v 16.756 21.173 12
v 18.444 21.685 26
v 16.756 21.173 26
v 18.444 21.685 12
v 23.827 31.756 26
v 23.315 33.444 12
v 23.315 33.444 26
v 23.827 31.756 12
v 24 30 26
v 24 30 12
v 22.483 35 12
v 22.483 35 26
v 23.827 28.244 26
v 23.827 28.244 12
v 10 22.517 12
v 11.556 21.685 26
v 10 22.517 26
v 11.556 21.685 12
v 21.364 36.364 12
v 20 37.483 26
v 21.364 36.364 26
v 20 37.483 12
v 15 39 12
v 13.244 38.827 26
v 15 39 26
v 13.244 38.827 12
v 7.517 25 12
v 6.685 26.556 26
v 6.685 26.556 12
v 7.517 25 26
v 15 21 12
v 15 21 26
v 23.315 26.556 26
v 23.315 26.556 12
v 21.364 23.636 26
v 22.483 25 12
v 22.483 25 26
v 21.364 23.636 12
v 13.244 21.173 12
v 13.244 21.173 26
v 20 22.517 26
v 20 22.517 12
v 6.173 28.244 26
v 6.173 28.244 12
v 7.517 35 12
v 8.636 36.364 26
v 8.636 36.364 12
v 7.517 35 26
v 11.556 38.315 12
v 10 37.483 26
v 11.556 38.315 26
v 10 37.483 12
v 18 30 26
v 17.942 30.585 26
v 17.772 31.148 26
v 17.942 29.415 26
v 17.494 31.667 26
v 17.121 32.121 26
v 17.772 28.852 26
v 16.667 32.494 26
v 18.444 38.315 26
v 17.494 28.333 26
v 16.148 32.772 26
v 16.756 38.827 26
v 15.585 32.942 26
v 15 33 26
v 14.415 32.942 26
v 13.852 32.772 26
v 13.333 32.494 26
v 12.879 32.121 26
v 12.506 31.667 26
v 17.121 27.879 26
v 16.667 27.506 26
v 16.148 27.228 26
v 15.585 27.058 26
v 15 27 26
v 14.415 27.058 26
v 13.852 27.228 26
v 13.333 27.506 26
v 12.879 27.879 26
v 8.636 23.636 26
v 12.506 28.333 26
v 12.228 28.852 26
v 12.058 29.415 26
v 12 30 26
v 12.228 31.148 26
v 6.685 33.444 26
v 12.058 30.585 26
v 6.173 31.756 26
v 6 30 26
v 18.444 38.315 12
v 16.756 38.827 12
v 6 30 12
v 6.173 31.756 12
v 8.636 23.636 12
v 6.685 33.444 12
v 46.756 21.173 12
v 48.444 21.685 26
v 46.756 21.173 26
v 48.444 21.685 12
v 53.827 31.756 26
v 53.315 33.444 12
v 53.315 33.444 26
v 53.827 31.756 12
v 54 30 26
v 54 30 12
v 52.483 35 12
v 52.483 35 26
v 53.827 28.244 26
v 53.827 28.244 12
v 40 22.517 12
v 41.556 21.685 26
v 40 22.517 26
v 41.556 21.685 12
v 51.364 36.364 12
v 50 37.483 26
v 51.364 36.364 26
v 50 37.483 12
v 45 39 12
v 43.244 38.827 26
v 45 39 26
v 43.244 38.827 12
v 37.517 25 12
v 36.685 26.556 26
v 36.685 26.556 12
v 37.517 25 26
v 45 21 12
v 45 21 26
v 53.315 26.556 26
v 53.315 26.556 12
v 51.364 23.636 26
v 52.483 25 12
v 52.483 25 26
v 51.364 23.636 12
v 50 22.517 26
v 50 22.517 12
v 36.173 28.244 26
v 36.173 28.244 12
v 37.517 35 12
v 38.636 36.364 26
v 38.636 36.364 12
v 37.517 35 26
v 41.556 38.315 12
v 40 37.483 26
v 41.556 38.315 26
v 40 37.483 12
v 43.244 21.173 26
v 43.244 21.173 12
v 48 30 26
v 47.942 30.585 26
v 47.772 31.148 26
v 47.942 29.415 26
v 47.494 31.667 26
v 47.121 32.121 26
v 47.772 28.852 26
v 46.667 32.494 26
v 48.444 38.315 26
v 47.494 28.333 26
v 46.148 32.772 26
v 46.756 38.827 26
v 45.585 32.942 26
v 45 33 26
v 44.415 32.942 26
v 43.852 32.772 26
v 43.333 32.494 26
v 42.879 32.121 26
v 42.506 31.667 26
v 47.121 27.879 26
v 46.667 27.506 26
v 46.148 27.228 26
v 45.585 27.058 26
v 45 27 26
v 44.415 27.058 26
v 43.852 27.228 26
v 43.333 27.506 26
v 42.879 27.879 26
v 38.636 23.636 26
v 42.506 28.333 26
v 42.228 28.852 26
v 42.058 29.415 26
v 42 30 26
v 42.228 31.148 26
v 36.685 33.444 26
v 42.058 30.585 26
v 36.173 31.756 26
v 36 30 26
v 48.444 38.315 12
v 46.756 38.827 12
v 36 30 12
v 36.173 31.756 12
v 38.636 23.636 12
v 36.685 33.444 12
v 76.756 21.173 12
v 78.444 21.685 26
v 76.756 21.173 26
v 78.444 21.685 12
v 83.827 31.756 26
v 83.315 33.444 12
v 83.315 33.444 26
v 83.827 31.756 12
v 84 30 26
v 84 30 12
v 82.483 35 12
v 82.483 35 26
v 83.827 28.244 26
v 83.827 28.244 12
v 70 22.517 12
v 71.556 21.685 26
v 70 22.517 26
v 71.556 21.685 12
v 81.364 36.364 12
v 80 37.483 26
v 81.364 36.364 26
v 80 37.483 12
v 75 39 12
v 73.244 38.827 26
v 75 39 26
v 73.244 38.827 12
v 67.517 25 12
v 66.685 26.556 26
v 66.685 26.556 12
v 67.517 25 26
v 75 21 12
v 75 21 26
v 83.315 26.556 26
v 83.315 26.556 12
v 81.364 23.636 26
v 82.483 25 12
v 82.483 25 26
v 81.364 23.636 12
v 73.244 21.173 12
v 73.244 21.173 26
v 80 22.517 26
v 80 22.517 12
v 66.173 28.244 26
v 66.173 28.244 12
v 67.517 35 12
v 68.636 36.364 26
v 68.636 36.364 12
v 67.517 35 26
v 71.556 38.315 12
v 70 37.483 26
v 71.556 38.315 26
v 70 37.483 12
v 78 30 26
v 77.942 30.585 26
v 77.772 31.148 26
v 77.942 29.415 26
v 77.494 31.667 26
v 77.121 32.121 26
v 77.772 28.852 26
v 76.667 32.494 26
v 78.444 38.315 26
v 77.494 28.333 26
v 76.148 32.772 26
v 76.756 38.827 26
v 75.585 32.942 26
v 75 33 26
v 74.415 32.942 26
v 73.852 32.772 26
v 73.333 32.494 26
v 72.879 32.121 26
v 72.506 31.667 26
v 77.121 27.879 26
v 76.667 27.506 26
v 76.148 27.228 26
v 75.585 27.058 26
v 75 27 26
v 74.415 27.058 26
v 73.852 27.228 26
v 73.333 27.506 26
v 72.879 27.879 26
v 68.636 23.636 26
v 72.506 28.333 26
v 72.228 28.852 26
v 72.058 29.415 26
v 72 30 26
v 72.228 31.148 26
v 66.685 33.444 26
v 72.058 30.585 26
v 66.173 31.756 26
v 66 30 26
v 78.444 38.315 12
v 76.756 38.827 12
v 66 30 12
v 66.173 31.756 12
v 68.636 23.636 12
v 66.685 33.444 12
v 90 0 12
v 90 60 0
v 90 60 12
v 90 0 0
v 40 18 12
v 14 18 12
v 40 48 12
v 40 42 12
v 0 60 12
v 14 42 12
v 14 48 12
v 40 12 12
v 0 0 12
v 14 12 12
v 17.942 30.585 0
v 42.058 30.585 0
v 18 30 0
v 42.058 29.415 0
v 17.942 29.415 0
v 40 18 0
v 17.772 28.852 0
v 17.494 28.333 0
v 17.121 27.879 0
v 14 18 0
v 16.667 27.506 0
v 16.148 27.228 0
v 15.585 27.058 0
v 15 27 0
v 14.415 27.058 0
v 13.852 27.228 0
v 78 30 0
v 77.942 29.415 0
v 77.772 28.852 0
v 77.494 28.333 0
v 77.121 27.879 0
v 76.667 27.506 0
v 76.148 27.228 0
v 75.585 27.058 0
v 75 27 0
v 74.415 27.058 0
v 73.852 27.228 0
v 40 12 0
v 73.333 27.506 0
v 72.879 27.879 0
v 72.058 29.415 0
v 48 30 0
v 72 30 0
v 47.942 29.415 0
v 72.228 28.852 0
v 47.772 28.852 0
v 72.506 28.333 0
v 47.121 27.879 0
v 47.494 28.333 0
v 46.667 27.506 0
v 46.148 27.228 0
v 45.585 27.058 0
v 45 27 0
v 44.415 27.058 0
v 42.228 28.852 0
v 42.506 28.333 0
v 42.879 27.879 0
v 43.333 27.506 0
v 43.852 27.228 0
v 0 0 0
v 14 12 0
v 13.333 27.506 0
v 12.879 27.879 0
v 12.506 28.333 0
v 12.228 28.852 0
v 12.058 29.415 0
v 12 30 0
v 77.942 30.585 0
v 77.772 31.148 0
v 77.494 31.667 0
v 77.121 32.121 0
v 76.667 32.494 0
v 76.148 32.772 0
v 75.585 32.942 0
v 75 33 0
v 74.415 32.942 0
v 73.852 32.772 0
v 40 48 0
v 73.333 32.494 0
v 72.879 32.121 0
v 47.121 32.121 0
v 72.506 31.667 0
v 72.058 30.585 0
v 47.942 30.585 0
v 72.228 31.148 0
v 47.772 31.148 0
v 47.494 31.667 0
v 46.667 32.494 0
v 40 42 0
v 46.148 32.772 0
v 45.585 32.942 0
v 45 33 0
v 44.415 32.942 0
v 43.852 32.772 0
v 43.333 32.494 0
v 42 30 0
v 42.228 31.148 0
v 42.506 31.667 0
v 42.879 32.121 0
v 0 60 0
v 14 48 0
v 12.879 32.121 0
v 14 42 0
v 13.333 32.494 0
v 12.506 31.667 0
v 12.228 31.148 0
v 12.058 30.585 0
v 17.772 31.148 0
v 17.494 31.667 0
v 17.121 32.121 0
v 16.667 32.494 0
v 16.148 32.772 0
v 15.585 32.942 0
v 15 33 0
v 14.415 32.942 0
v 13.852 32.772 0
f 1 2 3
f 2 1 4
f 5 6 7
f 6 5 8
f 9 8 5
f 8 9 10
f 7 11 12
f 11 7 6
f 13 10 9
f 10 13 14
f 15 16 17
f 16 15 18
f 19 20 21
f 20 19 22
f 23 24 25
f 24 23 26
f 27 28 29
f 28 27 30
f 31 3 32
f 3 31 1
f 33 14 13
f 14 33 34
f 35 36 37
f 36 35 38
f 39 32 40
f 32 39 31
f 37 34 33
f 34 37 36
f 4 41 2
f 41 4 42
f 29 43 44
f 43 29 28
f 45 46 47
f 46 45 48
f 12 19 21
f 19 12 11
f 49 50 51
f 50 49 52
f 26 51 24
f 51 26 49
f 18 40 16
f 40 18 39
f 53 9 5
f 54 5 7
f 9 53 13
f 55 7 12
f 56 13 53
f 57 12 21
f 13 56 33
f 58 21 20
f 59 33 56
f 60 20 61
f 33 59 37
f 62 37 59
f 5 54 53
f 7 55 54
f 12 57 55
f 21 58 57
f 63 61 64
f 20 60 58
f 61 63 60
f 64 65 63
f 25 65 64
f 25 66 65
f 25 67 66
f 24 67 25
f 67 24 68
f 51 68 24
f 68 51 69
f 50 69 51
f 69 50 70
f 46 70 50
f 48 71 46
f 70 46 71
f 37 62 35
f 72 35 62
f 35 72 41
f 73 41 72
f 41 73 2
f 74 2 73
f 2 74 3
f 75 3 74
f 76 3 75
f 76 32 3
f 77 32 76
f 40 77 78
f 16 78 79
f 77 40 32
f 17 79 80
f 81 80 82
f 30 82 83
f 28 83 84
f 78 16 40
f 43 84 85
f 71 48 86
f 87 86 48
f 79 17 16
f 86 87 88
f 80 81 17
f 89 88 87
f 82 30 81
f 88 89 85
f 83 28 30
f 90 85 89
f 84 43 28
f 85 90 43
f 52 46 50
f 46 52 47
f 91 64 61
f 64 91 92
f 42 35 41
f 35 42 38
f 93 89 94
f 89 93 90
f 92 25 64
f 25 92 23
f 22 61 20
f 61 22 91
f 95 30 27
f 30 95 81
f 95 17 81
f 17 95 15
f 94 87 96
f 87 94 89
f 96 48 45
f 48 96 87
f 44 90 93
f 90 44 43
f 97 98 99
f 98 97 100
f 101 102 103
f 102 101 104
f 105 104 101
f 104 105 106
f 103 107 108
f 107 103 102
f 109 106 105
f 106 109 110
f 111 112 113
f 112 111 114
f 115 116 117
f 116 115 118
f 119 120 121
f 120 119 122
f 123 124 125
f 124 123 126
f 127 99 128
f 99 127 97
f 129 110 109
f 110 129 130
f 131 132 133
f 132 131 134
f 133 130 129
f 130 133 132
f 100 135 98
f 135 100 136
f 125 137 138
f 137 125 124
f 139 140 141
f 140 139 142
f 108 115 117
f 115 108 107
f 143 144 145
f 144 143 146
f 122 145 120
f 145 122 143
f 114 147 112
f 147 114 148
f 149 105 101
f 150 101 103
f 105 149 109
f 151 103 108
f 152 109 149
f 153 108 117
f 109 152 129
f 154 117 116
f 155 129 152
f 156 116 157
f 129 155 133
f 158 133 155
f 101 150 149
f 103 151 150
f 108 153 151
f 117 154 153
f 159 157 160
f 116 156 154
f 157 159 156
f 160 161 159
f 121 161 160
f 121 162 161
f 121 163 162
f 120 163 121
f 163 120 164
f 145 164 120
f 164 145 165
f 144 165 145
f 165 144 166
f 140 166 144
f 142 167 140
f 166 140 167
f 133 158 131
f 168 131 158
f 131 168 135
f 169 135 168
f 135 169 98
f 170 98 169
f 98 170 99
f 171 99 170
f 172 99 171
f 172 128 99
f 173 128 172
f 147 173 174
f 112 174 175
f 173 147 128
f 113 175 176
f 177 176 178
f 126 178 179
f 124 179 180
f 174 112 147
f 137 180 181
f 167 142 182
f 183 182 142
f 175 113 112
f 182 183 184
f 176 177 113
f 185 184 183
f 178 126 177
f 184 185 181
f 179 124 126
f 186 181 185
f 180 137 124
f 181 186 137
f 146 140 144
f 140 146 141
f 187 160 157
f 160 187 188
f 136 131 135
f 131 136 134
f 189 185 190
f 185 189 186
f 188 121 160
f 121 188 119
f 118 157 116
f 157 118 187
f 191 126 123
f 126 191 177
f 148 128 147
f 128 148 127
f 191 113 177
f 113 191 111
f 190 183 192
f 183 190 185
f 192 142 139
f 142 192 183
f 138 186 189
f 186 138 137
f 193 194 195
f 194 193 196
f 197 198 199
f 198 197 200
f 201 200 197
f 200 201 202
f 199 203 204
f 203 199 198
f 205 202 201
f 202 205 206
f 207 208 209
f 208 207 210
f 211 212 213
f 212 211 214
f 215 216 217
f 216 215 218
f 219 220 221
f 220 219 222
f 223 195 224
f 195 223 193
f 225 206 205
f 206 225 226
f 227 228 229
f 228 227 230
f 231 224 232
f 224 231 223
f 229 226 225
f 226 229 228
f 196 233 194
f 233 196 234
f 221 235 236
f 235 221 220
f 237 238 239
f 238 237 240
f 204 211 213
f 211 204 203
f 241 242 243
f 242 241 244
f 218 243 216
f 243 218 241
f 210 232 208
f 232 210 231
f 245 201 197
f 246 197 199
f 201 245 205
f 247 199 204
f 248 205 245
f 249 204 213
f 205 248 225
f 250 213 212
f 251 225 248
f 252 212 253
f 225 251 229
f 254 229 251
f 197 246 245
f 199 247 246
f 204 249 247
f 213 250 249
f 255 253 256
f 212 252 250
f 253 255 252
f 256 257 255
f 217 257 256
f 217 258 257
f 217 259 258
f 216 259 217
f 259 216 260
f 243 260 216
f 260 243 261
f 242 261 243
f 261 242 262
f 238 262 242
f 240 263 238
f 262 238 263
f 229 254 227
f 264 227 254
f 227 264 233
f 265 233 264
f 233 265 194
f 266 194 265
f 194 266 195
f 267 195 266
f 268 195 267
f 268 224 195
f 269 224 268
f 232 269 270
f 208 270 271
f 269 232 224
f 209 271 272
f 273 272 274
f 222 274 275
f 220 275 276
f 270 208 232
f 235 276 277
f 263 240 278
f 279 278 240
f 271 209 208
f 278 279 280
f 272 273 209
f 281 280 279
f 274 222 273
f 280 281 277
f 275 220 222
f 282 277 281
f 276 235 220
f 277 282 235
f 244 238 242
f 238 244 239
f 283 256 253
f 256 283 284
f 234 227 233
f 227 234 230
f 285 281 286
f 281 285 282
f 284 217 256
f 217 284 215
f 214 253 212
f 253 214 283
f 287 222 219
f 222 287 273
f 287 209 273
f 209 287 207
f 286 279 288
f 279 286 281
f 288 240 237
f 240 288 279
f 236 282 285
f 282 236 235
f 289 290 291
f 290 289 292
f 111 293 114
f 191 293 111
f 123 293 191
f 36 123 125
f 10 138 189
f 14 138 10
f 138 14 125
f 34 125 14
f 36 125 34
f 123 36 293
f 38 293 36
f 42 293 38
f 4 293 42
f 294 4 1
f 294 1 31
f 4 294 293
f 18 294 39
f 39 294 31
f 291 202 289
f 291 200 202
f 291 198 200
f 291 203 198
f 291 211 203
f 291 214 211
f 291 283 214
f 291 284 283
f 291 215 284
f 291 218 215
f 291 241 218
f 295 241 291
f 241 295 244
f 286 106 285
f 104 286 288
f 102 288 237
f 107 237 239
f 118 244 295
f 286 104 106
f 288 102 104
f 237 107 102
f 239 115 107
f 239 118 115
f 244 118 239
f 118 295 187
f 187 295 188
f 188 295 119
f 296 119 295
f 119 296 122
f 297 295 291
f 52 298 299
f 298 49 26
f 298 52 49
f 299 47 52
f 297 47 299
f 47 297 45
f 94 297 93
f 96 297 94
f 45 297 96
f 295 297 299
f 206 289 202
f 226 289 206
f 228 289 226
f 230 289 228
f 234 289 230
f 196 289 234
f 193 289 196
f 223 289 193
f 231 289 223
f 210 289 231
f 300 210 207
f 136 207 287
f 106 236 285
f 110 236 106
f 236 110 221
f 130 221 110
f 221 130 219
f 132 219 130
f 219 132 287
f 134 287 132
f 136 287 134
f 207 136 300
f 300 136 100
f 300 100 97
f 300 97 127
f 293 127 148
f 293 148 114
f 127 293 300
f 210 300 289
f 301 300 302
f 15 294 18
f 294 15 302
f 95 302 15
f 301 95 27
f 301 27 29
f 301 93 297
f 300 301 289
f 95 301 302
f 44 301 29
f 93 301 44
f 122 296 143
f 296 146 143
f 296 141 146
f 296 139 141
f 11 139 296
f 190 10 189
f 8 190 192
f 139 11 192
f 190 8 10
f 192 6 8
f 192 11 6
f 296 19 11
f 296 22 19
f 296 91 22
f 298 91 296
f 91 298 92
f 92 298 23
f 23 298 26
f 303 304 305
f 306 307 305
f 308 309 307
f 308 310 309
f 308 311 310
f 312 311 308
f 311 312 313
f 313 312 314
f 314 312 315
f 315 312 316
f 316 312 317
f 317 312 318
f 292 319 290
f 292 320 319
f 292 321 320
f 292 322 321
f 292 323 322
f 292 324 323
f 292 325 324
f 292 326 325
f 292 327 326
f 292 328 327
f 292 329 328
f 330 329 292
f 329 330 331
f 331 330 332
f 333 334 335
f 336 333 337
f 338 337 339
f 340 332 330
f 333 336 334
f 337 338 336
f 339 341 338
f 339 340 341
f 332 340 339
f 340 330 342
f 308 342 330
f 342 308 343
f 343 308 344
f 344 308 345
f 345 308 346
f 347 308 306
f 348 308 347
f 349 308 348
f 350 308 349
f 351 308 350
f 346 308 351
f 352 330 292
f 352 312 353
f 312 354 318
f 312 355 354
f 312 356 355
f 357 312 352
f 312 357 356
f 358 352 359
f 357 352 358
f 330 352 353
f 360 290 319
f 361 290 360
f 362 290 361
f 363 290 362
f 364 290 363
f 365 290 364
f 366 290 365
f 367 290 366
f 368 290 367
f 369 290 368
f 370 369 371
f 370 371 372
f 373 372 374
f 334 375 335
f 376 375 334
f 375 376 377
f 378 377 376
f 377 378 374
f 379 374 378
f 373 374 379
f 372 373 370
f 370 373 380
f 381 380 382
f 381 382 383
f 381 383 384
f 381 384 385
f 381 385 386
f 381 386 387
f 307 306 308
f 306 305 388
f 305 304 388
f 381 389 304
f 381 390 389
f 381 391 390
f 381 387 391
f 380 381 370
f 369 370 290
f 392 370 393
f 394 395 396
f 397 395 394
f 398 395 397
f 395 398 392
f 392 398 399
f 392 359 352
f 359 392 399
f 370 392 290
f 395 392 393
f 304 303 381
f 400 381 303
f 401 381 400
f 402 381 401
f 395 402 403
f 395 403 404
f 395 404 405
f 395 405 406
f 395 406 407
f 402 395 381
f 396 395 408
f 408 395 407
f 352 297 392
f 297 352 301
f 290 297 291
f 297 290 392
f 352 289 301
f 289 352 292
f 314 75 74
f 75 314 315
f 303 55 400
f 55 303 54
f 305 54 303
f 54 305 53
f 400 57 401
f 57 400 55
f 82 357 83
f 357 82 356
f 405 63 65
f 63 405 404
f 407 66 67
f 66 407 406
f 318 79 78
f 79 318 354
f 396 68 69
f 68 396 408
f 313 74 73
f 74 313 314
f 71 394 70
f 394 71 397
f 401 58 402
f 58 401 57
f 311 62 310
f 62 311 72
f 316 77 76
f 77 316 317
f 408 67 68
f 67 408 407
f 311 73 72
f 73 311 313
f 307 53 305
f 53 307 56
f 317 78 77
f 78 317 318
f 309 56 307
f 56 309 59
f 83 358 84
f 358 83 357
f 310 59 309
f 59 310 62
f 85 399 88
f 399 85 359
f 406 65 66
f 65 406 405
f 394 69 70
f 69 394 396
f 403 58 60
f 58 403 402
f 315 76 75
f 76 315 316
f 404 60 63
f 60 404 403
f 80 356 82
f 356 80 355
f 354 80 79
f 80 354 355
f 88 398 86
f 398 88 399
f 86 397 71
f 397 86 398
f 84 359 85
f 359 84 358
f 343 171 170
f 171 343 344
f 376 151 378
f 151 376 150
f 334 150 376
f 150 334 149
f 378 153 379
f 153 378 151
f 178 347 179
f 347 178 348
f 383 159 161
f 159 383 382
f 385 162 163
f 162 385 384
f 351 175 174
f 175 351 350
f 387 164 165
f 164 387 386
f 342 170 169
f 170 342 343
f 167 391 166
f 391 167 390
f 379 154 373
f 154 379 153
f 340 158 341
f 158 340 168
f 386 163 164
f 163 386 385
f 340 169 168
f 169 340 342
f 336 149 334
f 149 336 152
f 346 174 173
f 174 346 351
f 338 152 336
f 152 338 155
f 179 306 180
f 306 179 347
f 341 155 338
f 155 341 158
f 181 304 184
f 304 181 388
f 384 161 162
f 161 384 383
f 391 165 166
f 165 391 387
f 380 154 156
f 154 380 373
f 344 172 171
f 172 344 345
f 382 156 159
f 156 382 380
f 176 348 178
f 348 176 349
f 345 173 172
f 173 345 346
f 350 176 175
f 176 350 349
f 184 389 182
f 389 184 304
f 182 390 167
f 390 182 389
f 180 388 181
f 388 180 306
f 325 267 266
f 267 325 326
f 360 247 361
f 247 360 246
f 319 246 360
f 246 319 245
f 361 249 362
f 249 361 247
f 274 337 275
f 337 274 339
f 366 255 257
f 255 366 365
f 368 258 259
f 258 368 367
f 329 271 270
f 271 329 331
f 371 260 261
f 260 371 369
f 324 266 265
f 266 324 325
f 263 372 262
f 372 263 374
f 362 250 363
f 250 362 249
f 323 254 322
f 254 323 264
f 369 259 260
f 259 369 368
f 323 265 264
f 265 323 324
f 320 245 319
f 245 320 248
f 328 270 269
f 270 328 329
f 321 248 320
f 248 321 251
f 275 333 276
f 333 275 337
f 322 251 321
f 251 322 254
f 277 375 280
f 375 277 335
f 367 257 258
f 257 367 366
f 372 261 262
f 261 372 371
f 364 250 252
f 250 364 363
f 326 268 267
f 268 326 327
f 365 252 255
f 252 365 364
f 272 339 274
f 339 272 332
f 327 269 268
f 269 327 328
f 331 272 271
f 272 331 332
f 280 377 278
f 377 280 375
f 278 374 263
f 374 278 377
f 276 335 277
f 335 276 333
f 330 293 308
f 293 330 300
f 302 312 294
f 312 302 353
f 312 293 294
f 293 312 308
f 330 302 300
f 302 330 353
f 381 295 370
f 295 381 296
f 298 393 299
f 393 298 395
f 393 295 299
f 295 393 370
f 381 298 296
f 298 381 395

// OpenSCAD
$fn = 32;

// ----------------------------------------------------------------------
// Drill jig: three_boss_slot jig
// ----------------------------------------------------------------------

// --- parameters (mm) ---
plate_l = 90;             // plate length, X
plate_w = 60;             // plate width, Y
plate_t = 12;             // plate thickness
boss_d = 18;              // guide boss diameter
boss_h = 15;              // boss height above the plate
guide_d = 6;              // guide hole diameter
boss_pitch = 30;          // boss pitch
slot_w = 6;               // clamp slot width
slot_l = 26;              // clamp slot length
slot_x = 14;              // slot start X

n_boss = 3;  // guide bosses
boss_x0 = (plate_l - (n_boss - 1) * boss_pitch) / 2;  // first boss X
boss_top = plate_t - 1 + boss_h;  // boss crown height
total_h = boss_top;  // overall height

difference() {
  union() {
  cube([plate_l, plate_w, plate_t]);
  for (i = [0 : n_boss - 1])
    translate([boss_x0 + i * boss_pitch, plate_w / 2, plate_t - 1])
      cylinder(h = boss_h, d = boss_d);
  }
  for (i = [0 : n_boss - 1])
    translate([boss_x0 + i * boss_pitch, plate_w / 2, -1])
      cylinder(h = plate_t + boss_h, d = guide_d);
  for (cy = [plate_w * 0.25, plate_w * 0.75])
    translate([slot_x, cy - slot_w / 2, -1])
      cube([slot_l, slot_w, plate_t + 2]);
}
